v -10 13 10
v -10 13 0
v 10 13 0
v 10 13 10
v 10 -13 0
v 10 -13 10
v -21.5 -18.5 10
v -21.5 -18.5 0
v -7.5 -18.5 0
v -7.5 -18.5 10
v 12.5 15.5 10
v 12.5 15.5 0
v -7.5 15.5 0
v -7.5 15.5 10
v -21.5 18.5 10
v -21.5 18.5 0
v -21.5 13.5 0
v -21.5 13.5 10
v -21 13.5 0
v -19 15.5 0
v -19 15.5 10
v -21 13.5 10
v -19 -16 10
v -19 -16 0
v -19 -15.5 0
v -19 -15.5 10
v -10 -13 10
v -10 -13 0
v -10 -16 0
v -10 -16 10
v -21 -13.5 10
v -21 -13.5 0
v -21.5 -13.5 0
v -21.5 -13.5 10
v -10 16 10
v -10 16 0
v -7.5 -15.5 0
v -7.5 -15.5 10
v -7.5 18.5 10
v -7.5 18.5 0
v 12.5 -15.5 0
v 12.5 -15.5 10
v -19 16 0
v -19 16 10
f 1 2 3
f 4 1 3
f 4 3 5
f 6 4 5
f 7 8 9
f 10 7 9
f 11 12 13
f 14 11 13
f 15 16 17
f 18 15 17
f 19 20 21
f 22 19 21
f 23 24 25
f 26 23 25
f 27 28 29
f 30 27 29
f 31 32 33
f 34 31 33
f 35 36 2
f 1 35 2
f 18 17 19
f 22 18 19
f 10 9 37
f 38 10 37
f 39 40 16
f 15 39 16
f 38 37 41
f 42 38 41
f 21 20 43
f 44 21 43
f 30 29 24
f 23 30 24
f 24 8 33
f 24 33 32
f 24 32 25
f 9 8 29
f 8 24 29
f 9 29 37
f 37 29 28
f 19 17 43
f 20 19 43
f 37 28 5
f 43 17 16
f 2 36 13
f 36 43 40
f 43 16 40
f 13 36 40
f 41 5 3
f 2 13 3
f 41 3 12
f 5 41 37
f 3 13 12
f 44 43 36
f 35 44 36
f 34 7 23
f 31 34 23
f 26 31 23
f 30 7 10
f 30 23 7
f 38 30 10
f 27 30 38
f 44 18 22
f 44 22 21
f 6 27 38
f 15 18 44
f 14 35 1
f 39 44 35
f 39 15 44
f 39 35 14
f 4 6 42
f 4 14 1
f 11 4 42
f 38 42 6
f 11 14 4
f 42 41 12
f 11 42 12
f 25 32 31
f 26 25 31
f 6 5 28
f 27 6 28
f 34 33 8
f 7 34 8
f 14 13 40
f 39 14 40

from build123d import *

# Parameters (mm, degrees)
F1_DEPTH = 10
F2_SIZE  = 2


with BuildPart() as f1:
    # F0 (on Top) → F1 (new body)
    with BuildSketch(Plane.XY):
        Polygon((-10, 13), (10, 13), (10, -13), (-10, -13), (-10, -16), (-19, -16), (-19, -13.5), (-21.5, -13.5), (-21.5, -18.5), (-19, -18.5), (-7.5, -18.5), (-7.5, -15.5), (12.5, -15.5), (12.5, 15.5), (-7.5, 15.5), (-7.5, 18.5), (-19, 18.5), (-21.5, 18.5), (-21.5, 13.5), (-19, 13.5), (-19, 16), (-10, 16), align=None)
    extrude(amount=F1_DEPTH)

    # F2
    f2_edges = [f1.edges().sort_by_distance(p)[0] for p in [
        (-19, 13.5, 5),
        (-19, -13.5, 5),
    ]]
    chamfer(f2_edges, length=F2_SIZE)


solid = f1.part
